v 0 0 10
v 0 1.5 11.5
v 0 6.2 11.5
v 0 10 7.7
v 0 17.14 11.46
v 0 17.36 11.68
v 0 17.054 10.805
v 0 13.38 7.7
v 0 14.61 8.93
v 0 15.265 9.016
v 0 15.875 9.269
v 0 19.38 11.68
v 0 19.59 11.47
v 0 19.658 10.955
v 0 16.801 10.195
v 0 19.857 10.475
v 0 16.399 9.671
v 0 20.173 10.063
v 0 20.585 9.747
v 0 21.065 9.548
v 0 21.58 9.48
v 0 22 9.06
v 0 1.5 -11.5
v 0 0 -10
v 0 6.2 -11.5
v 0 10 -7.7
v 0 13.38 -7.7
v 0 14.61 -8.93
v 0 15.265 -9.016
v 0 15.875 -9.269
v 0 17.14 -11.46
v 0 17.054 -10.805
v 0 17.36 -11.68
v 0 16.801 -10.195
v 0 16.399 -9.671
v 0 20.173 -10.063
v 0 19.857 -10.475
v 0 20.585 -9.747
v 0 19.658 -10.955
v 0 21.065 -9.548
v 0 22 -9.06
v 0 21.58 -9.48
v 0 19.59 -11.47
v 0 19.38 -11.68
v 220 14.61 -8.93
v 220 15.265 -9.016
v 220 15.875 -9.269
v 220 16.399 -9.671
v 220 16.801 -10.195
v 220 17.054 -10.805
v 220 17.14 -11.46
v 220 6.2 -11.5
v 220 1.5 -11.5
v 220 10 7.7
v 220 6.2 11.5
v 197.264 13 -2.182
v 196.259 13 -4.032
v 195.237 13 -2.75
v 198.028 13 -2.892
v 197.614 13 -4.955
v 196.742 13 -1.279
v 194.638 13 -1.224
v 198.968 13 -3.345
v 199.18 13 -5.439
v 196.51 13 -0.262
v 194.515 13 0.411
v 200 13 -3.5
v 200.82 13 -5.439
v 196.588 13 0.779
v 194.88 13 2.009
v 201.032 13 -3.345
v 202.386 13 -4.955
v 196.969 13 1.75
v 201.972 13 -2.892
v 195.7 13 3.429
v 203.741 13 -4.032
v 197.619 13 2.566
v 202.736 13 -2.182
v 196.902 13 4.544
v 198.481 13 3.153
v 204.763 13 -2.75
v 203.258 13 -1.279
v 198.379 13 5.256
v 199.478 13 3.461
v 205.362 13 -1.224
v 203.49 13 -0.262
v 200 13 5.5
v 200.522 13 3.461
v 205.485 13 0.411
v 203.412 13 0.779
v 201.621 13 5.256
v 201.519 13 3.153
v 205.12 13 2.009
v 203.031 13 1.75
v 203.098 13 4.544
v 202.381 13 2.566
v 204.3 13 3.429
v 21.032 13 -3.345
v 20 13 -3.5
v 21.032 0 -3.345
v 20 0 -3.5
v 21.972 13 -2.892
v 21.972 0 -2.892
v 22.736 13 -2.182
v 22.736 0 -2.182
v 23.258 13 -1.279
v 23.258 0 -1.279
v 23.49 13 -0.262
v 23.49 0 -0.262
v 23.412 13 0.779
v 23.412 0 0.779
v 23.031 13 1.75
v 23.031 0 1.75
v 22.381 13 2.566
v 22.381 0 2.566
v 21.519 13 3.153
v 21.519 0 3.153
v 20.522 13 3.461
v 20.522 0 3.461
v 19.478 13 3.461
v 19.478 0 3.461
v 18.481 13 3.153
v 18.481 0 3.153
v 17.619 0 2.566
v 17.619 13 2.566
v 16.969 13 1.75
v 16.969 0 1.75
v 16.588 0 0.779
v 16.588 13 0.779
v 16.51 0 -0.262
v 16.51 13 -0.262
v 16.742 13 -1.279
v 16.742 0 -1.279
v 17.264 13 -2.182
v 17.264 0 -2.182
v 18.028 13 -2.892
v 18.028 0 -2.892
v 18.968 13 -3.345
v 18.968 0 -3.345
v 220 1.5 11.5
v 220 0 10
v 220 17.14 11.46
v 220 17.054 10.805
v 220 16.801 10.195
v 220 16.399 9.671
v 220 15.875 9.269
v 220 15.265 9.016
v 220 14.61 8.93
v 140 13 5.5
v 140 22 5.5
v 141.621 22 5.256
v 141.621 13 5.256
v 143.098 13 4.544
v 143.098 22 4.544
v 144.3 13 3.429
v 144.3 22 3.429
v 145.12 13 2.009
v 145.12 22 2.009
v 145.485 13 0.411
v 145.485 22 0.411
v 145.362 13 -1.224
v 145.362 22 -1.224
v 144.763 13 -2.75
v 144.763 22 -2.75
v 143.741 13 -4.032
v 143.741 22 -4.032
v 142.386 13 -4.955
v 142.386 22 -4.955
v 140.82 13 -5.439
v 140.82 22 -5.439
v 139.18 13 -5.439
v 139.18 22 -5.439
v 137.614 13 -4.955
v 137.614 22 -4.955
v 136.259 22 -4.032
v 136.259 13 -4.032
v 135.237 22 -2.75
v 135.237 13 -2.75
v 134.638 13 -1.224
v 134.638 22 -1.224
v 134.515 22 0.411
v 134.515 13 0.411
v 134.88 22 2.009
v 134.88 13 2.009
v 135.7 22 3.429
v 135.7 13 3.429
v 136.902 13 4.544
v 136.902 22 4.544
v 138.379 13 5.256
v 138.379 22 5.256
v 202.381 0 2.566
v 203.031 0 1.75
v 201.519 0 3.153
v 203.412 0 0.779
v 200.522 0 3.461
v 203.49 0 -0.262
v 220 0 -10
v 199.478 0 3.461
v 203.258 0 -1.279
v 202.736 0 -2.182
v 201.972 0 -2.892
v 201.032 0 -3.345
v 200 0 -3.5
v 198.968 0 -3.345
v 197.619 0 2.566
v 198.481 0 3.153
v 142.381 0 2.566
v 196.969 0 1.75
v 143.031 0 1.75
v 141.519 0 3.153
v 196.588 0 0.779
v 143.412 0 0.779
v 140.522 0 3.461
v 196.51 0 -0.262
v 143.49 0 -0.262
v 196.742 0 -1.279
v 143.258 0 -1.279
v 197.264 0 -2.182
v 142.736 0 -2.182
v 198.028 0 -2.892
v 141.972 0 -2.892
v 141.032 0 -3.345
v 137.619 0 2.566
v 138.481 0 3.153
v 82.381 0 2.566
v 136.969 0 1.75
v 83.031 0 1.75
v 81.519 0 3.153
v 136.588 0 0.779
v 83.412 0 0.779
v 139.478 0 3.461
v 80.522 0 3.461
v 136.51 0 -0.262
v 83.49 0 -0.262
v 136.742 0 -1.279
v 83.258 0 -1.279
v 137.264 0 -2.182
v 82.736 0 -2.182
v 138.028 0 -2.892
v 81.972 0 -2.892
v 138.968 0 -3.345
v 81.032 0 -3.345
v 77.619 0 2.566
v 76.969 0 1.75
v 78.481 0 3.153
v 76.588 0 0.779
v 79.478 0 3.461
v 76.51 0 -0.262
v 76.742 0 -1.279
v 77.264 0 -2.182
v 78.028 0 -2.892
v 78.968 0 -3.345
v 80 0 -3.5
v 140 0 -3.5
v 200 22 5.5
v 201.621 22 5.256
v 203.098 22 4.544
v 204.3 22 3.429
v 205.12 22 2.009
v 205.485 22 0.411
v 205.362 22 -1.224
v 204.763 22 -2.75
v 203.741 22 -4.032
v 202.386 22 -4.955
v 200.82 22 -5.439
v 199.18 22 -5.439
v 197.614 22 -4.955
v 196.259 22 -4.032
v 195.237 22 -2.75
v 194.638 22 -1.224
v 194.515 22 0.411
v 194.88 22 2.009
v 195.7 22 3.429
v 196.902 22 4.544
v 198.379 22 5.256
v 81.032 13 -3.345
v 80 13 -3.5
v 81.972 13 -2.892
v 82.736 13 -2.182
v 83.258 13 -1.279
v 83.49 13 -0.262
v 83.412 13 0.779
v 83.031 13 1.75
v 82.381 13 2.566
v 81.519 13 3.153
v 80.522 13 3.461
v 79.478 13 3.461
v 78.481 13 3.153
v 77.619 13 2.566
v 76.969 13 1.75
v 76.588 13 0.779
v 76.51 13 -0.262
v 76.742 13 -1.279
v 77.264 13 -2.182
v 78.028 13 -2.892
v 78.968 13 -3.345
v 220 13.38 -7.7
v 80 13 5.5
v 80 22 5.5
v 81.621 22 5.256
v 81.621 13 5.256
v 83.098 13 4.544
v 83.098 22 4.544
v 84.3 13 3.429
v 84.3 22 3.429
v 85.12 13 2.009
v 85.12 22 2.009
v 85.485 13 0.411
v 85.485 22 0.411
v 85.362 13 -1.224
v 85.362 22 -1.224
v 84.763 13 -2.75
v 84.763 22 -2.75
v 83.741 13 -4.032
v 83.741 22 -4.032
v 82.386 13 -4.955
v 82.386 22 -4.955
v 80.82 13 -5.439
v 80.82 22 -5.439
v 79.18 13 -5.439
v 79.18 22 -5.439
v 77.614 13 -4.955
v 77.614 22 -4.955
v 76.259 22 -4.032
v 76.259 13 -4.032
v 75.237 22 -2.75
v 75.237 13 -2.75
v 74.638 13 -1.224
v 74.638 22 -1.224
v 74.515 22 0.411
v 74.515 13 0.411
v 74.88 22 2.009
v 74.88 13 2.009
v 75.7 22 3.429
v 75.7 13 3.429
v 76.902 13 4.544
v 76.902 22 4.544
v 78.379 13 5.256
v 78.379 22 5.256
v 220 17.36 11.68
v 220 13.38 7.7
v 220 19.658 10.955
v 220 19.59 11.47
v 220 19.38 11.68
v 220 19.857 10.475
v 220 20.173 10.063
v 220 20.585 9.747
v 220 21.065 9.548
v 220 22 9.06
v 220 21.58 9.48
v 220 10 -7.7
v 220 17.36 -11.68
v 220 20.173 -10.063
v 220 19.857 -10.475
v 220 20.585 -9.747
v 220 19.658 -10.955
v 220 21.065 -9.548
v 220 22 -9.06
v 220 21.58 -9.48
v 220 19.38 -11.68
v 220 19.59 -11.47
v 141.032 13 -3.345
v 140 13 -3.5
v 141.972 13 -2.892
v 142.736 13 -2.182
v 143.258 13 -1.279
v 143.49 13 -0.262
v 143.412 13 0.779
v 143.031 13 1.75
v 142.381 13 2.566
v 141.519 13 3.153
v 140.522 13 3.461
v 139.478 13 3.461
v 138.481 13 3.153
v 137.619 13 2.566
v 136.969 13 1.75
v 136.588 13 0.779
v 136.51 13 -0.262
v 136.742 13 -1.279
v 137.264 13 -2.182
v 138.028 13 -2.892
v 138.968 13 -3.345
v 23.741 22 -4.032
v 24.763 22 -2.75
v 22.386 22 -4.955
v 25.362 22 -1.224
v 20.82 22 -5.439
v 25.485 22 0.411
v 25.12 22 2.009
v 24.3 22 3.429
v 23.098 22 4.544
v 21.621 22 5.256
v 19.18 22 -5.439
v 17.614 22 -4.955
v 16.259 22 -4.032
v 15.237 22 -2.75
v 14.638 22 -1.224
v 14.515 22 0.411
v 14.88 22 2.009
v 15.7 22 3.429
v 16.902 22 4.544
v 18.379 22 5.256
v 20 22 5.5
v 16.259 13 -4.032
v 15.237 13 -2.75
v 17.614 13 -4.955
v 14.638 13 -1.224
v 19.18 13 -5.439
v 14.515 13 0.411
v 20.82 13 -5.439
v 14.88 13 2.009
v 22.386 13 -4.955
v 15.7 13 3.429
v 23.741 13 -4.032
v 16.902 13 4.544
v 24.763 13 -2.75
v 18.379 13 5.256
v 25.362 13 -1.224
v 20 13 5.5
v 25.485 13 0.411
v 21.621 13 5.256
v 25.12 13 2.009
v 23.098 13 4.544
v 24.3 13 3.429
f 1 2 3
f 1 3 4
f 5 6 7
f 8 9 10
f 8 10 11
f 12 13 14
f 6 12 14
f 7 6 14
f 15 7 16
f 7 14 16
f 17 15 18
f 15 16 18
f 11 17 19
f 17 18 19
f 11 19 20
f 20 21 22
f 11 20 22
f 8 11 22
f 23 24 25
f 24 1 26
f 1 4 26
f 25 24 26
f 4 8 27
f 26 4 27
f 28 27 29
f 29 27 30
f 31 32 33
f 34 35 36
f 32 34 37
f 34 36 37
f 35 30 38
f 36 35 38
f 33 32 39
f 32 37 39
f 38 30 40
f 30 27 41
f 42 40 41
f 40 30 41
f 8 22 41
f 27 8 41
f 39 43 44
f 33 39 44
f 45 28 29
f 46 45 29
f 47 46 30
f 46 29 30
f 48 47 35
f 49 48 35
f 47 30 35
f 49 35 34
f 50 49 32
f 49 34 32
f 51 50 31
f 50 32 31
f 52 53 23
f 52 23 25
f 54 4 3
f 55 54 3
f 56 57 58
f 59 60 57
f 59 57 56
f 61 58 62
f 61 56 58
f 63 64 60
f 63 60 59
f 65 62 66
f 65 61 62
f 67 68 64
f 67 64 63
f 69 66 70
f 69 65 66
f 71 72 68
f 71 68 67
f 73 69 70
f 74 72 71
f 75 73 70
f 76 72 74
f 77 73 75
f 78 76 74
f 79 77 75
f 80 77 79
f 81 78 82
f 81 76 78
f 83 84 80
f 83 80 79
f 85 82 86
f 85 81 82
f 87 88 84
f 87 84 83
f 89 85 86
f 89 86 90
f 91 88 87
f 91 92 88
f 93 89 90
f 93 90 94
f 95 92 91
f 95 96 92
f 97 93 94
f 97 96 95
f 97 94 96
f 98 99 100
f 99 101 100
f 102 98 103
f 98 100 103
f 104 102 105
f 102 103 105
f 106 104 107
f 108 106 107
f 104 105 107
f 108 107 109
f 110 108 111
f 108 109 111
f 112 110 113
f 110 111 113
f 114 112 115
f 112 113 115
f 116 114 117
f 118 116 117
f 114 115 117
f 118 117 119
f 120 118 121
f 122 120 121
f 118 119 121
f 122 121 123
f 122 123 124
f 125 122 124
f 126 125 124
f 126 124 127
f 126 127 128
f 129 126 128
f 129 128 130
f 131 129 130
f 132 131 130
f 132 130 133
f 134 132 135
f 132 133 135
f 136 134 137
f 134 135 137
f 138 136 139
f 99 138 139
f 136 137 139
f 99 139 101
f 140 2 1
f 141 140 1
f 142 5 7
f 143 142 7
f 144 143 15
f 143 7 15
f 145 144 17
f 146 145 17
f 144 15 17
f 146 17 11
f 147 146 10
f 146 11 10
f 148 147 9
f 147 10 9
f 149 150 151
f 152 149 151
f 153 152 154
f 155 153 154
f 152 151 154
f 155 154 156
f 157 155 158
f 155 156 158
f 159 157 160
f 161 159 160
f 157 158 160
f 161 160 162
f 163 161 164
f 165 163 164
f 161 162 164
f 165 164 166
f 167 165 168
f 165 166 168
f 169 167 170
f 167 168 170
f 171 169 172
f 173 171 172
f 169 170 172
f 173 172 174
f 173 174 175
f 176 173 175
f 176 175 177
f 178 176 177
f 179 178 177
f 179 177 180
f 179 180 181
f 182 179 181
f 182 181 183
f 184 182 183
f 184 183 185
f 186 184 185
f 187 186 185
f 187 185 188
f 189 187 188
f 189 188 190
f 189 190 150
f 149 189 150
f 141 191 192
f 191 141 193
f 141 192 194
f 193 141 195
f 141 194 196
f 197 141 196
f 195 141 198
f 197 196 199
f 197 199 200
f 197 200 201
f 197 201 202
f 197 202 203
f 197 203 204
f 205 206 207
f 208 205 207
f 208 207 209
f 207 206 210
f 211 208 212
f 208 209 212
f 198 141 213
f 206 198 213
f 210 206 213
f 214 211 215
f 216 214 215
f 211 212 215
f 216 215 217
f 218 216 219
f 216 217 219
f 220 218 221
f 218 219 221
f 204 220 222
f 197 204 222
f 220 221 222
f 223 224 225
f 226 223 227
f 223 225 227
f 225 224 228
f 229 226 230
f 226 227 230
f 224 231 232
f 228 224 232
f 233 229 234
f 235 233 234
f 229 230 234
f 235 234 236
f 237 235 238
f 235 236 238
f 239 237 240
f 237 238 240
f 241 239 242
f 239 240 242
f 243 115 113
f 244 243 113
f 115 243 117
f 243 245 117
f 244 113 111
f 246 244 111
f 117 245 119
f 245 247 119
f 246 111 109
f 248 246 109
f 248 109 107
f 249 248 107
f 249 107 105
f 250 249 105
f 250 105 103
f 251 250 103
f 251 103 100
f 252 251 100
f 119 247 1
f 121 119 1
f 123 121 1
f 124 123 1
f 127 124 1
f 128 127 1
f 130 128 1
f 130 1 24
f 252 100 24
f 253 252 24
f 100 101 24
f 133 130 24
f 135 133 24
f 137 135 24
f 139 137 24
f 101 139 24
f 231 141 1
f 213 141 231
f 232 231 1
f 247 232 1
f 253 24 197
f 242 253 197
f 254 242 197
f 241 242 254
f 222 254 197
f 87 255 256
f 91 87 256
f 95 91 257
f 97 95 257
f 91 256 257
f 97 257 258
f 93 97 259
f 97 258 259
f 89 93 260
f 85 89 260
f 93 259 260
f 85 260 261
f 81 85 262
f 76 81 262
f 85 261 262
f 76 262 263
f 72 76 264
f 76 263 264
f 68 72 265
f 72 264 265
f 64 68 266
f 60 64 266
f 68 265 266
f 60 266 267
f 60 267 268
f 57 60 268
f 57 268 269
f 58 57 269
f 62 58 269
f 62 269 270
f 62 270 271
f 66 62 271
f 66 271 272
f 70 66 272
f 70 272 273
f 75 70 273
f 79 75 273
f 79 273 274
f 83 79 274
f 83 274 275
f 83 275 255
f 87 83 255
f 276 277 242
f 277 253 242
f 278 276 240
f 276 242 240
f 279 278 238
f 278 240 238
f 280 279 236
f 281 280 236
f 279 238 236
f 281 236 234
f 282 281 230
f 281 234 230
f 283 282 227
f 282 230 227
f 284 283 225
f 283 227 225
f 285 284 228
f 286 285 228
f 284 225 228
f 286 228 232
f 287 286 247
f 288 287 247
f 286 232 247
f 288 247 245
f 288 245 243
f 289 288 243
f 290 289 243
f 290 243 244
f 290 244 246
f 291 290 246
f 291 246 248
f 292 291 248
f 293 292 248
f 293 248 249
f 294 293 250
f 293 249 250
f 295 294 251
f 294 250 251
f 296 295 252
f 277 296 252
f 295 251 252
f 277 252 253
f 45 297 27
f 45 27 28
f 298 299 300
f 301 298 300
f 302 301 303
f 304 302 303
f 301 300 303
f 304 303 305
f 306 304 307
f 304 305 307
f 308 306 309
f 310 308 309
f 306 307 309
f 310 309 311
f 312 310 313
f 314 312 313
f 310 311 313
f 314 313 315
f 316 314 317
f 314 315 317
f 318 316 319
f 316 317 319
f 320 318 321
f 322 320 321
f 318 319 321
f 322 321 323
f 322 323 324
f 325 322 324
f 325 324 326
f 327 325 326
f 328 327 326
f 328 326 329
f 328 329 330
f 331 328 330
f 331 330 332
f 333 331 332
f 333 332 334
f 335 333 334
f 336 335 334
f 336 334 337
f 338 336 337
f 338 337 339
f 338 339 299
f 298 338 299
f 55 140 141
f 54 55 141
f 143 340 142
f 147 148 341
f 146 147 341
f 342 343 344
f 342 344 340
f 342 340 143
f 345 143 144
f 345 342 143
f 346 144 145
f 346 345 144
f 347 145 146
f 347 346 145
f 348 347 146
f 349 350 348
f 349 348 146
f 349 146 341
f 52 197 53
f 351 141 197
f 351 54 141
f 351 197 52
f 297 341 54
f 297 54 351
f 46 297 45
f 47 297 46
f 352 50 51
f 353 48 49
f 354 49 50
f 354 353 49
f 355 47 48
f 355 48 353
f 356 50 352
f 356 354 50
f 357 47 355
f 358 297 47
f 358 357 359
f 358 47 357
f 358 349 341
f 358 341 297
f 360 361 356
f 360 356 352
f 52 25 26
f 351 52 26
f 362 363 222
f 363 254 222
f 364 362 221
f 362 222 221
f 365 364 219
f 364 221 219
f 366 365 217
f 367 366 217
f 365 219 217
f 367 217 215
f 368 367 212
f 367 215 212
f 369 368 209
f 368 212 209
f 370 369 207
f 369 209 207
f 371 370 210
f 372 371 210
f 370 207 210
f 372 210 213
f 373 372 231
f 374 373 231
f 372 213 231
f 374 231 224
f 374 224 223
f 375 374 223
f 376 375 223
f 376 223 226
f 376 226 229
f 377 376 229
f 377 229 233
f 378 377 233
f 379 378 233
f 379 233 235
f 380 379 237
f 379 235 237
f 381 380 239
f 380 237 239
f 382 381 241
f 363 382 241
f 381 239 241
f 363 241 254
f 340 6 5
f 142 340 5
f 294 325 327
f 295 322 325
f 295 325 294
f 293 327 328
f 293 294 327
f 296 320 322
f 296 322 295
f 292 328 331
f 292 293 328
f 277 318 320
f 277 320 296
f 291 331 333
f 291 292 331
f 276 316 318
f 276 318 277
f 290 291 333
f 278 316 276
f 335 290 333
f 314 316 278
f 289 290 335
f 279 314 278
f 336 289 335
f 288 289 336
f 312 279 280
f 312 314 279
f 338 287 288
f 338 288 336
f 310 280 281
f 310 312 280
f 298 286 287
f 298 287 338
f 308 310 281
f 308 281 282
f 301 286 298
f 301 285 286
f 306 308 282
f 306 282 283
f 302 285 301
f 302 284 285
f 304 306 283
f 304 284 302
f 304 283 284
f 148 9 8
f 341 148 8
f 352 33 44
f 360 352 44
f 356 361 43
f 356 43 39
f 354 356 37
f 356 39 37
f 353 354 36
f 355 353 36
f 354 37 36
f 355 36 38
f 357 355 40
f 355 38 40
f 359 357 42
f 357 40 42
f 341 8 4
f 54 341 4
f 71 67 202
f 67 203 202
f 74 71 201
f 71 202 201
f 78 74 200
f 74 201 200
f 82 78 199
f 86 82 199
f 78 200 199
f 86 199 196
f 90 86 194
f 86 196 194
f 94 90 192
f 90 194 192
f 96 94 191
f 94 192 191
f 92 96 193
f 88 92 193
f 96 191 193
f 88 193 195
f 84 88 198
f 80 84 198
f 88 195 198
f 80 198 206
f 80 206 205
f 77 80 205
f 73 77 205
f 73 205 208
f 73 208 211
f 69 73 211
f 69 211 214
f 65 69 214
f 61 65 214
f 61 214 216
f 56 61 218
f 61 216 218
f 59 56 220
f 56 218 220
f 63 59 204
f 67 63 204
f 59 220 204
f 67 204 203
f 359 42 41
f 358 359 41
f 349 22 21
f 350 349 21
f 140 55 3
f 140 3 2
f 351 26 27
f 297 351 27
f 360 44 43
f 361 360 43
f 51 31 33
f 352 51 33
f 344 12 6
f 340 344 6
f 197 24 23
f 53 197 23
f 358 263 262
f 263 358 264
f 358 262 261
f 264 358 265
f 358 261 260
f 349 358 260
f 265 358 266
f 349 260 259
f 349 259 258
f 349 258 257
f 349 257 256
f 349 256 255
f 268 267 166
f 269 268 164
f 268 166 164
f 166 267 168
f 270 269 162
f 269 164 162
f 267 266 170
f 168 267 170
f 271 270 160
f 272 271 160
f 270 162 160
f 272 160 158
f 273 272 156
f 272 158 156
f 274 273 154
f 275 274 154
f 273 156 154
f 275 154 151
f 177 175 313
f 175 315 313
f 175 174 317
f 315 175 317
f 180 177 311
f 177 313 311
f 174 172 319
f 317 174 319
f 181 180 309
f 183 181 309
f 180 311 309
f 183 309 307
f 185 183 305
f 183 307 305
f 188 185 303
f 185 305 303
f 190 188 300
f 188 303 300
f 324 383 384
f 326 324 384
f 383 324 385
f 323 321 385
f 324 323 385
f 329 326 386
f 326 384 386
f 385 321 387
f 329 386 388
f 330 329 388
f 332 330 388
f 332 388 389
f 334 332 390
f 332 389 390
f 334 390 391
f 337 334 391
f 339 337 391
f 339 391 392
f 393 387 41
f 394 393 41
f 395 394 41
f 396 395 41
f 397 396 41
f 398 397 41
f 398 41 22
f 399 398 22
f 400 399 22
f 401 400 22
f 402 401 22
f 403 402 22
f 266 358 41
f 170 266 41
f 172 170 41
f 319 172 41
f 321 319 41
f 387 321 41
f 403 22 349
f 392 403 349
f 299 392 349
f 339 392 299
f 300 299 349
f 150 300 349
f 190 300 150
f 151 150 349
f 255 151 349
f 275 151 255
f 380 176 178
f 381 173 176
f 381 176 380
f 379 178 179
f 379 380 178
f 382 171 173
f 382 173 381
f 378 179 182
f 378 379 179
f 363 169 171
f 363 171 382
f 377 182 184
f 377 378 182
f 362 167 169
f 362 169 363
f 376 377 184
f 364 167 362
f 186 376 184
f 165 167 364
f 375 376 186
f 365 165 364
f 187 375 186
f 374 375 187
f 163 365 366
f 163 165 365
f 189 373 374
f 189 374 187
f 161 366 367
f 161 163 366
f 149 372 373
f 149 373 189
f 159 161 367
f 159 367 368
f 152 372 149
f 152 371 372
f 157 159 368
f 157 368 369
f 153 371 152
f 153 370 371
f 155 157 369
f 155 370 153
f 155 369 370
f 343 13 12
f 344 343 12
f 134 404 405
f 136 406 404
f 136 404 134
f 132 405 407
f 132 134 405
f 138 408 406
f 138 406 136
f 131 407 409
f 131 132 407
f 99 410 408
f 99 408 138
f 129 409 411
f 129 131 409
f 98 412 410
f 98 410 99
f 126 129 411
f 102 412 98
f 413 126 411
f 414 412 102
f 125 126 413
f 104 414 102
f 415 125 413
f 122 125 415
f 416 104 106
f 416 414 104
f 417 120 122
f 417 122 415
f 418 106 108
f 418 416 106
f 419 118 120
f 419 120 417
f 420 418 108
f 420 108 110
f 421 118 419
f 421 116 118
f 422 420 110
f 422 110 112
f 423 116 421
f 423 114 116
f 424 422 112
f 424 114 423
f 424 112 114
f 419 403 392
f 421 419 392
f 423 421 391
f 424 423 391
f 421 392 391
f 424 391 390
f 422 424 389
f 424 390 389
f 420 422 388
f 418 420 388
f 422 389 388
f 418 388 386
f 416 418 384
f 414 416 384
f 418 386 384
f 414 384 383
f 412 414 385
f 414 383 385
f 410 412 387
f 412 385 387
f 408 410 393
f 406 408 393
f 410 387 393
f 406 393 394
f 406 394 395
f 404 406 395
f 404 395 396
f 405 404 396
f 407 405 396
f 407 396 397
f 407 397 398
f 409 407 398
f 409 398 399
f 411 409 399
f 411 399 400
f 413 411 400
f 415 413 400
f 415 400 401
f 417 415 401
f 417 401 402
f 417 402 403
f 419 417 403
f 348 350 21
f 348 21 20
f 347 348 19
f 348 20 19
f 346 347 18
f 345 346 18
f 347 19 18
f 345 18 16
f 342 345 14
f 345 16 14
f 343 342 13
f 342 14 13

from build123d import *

# Parameters (mm, degrees)
BOSS_EXTRUDE1_DEPTH   = 220
BOLT_HOLE_D           = 7
BOLT_HOLE_CBORE_D     = 11
BOLT_HOLE_CBORE_DEPTH = 9
BOLT_PATTERN_COUNT    = 4
BOLT_PATTERN_PITCH    = 60


with BuildPart() as part:
    # Sketch1 → Boss-Extrude1 (new body)
    with BuildSketch(Plane(origin=(0, 0, 0), x_dir=(0, 0, -1), z_dir=(1, 0, 0))):
        with BuildLine():
            Line((-10, 0), (10, 0))
            Line((10, 0), (11.5, 1.5))
            Line((11.5, 1.5), (11.5, 6.2))
            Line((11.5, 6.2), (7.7, 10))
            Line((7.7, 10), (7.7, 13.38))
            Line((7.7, 13.38), (8.93, 14.61))
            ThreePointArc((8.93, 14.61), (9.671019844, 16.398980156), (11.46, 17.14))
            Line((11.46, 17.14), (11.68, 17.36))
            Line((11.68, 17.36), (11.68, 19.38))
            Line((11.68, 19.38), (11.47, 19.59))
            ThreePointArc((11.47, 19.59), (10.062857505, 20.172857505), (9.48, 21.58))
            Line((9.48, 21.58), (9.06, 22))
            Line((9.06, 22), (-9.06, 22))
            Line((-9.06, 22), (-9.48, 21.58))
            ThreePointArc((-9.48, 21.58), (-10.062857505, 20.172857505), (-11.47, 19.59))
            Line((-11.47, 19.59), (-11.68, 19.38))
            Line((-11.68, 19.38), (-11.68, 17.36))
            Line((-11.68, 17.36), (-11.46, 17.14))
            ThreePointArc((-11.46, 17.14), (-9.671019844, 16.398980156), (-8.93, 14.61))
            Line((-8.93, 14.61), (-7.7, 13.38))
            Line((-7.7, 13.38), (-7.7, 10))
            Line((-7.7, 10), (-11.5, 6.2))
            Line((-11.5, 6.2), (-11.5, 1.5))
            Line((-11.5, 1.5), (-10, 0))
        make_face()
    extrude(amount=BOSS_EXTRUDE1_DEPTH)

    # Bolt Hole (through all)
    with Locations(Plane(origin=(20, 22, 0), x_dir=(0, 0, 1), z_dir=(0, 1, 0))):
        with Locations((0, 0)):
            bolt_hole = CounterBoreHole(BOLT_HOLE_D / 2, BOLT_HOLE_CBORE_D / 2, BOLT_HOLE_CBORE_DEPTH)

    # Bolt Pattern: Bolt Hole ×4
    with Locations(*[(i * BOLT_PATTERN_PITCH, 0, 0) for i in range(1, BOLT_PATTERN_COUNT)]):
        add(bolt_hole, mode=Mode.SUBTRACT)


solid = part.part
